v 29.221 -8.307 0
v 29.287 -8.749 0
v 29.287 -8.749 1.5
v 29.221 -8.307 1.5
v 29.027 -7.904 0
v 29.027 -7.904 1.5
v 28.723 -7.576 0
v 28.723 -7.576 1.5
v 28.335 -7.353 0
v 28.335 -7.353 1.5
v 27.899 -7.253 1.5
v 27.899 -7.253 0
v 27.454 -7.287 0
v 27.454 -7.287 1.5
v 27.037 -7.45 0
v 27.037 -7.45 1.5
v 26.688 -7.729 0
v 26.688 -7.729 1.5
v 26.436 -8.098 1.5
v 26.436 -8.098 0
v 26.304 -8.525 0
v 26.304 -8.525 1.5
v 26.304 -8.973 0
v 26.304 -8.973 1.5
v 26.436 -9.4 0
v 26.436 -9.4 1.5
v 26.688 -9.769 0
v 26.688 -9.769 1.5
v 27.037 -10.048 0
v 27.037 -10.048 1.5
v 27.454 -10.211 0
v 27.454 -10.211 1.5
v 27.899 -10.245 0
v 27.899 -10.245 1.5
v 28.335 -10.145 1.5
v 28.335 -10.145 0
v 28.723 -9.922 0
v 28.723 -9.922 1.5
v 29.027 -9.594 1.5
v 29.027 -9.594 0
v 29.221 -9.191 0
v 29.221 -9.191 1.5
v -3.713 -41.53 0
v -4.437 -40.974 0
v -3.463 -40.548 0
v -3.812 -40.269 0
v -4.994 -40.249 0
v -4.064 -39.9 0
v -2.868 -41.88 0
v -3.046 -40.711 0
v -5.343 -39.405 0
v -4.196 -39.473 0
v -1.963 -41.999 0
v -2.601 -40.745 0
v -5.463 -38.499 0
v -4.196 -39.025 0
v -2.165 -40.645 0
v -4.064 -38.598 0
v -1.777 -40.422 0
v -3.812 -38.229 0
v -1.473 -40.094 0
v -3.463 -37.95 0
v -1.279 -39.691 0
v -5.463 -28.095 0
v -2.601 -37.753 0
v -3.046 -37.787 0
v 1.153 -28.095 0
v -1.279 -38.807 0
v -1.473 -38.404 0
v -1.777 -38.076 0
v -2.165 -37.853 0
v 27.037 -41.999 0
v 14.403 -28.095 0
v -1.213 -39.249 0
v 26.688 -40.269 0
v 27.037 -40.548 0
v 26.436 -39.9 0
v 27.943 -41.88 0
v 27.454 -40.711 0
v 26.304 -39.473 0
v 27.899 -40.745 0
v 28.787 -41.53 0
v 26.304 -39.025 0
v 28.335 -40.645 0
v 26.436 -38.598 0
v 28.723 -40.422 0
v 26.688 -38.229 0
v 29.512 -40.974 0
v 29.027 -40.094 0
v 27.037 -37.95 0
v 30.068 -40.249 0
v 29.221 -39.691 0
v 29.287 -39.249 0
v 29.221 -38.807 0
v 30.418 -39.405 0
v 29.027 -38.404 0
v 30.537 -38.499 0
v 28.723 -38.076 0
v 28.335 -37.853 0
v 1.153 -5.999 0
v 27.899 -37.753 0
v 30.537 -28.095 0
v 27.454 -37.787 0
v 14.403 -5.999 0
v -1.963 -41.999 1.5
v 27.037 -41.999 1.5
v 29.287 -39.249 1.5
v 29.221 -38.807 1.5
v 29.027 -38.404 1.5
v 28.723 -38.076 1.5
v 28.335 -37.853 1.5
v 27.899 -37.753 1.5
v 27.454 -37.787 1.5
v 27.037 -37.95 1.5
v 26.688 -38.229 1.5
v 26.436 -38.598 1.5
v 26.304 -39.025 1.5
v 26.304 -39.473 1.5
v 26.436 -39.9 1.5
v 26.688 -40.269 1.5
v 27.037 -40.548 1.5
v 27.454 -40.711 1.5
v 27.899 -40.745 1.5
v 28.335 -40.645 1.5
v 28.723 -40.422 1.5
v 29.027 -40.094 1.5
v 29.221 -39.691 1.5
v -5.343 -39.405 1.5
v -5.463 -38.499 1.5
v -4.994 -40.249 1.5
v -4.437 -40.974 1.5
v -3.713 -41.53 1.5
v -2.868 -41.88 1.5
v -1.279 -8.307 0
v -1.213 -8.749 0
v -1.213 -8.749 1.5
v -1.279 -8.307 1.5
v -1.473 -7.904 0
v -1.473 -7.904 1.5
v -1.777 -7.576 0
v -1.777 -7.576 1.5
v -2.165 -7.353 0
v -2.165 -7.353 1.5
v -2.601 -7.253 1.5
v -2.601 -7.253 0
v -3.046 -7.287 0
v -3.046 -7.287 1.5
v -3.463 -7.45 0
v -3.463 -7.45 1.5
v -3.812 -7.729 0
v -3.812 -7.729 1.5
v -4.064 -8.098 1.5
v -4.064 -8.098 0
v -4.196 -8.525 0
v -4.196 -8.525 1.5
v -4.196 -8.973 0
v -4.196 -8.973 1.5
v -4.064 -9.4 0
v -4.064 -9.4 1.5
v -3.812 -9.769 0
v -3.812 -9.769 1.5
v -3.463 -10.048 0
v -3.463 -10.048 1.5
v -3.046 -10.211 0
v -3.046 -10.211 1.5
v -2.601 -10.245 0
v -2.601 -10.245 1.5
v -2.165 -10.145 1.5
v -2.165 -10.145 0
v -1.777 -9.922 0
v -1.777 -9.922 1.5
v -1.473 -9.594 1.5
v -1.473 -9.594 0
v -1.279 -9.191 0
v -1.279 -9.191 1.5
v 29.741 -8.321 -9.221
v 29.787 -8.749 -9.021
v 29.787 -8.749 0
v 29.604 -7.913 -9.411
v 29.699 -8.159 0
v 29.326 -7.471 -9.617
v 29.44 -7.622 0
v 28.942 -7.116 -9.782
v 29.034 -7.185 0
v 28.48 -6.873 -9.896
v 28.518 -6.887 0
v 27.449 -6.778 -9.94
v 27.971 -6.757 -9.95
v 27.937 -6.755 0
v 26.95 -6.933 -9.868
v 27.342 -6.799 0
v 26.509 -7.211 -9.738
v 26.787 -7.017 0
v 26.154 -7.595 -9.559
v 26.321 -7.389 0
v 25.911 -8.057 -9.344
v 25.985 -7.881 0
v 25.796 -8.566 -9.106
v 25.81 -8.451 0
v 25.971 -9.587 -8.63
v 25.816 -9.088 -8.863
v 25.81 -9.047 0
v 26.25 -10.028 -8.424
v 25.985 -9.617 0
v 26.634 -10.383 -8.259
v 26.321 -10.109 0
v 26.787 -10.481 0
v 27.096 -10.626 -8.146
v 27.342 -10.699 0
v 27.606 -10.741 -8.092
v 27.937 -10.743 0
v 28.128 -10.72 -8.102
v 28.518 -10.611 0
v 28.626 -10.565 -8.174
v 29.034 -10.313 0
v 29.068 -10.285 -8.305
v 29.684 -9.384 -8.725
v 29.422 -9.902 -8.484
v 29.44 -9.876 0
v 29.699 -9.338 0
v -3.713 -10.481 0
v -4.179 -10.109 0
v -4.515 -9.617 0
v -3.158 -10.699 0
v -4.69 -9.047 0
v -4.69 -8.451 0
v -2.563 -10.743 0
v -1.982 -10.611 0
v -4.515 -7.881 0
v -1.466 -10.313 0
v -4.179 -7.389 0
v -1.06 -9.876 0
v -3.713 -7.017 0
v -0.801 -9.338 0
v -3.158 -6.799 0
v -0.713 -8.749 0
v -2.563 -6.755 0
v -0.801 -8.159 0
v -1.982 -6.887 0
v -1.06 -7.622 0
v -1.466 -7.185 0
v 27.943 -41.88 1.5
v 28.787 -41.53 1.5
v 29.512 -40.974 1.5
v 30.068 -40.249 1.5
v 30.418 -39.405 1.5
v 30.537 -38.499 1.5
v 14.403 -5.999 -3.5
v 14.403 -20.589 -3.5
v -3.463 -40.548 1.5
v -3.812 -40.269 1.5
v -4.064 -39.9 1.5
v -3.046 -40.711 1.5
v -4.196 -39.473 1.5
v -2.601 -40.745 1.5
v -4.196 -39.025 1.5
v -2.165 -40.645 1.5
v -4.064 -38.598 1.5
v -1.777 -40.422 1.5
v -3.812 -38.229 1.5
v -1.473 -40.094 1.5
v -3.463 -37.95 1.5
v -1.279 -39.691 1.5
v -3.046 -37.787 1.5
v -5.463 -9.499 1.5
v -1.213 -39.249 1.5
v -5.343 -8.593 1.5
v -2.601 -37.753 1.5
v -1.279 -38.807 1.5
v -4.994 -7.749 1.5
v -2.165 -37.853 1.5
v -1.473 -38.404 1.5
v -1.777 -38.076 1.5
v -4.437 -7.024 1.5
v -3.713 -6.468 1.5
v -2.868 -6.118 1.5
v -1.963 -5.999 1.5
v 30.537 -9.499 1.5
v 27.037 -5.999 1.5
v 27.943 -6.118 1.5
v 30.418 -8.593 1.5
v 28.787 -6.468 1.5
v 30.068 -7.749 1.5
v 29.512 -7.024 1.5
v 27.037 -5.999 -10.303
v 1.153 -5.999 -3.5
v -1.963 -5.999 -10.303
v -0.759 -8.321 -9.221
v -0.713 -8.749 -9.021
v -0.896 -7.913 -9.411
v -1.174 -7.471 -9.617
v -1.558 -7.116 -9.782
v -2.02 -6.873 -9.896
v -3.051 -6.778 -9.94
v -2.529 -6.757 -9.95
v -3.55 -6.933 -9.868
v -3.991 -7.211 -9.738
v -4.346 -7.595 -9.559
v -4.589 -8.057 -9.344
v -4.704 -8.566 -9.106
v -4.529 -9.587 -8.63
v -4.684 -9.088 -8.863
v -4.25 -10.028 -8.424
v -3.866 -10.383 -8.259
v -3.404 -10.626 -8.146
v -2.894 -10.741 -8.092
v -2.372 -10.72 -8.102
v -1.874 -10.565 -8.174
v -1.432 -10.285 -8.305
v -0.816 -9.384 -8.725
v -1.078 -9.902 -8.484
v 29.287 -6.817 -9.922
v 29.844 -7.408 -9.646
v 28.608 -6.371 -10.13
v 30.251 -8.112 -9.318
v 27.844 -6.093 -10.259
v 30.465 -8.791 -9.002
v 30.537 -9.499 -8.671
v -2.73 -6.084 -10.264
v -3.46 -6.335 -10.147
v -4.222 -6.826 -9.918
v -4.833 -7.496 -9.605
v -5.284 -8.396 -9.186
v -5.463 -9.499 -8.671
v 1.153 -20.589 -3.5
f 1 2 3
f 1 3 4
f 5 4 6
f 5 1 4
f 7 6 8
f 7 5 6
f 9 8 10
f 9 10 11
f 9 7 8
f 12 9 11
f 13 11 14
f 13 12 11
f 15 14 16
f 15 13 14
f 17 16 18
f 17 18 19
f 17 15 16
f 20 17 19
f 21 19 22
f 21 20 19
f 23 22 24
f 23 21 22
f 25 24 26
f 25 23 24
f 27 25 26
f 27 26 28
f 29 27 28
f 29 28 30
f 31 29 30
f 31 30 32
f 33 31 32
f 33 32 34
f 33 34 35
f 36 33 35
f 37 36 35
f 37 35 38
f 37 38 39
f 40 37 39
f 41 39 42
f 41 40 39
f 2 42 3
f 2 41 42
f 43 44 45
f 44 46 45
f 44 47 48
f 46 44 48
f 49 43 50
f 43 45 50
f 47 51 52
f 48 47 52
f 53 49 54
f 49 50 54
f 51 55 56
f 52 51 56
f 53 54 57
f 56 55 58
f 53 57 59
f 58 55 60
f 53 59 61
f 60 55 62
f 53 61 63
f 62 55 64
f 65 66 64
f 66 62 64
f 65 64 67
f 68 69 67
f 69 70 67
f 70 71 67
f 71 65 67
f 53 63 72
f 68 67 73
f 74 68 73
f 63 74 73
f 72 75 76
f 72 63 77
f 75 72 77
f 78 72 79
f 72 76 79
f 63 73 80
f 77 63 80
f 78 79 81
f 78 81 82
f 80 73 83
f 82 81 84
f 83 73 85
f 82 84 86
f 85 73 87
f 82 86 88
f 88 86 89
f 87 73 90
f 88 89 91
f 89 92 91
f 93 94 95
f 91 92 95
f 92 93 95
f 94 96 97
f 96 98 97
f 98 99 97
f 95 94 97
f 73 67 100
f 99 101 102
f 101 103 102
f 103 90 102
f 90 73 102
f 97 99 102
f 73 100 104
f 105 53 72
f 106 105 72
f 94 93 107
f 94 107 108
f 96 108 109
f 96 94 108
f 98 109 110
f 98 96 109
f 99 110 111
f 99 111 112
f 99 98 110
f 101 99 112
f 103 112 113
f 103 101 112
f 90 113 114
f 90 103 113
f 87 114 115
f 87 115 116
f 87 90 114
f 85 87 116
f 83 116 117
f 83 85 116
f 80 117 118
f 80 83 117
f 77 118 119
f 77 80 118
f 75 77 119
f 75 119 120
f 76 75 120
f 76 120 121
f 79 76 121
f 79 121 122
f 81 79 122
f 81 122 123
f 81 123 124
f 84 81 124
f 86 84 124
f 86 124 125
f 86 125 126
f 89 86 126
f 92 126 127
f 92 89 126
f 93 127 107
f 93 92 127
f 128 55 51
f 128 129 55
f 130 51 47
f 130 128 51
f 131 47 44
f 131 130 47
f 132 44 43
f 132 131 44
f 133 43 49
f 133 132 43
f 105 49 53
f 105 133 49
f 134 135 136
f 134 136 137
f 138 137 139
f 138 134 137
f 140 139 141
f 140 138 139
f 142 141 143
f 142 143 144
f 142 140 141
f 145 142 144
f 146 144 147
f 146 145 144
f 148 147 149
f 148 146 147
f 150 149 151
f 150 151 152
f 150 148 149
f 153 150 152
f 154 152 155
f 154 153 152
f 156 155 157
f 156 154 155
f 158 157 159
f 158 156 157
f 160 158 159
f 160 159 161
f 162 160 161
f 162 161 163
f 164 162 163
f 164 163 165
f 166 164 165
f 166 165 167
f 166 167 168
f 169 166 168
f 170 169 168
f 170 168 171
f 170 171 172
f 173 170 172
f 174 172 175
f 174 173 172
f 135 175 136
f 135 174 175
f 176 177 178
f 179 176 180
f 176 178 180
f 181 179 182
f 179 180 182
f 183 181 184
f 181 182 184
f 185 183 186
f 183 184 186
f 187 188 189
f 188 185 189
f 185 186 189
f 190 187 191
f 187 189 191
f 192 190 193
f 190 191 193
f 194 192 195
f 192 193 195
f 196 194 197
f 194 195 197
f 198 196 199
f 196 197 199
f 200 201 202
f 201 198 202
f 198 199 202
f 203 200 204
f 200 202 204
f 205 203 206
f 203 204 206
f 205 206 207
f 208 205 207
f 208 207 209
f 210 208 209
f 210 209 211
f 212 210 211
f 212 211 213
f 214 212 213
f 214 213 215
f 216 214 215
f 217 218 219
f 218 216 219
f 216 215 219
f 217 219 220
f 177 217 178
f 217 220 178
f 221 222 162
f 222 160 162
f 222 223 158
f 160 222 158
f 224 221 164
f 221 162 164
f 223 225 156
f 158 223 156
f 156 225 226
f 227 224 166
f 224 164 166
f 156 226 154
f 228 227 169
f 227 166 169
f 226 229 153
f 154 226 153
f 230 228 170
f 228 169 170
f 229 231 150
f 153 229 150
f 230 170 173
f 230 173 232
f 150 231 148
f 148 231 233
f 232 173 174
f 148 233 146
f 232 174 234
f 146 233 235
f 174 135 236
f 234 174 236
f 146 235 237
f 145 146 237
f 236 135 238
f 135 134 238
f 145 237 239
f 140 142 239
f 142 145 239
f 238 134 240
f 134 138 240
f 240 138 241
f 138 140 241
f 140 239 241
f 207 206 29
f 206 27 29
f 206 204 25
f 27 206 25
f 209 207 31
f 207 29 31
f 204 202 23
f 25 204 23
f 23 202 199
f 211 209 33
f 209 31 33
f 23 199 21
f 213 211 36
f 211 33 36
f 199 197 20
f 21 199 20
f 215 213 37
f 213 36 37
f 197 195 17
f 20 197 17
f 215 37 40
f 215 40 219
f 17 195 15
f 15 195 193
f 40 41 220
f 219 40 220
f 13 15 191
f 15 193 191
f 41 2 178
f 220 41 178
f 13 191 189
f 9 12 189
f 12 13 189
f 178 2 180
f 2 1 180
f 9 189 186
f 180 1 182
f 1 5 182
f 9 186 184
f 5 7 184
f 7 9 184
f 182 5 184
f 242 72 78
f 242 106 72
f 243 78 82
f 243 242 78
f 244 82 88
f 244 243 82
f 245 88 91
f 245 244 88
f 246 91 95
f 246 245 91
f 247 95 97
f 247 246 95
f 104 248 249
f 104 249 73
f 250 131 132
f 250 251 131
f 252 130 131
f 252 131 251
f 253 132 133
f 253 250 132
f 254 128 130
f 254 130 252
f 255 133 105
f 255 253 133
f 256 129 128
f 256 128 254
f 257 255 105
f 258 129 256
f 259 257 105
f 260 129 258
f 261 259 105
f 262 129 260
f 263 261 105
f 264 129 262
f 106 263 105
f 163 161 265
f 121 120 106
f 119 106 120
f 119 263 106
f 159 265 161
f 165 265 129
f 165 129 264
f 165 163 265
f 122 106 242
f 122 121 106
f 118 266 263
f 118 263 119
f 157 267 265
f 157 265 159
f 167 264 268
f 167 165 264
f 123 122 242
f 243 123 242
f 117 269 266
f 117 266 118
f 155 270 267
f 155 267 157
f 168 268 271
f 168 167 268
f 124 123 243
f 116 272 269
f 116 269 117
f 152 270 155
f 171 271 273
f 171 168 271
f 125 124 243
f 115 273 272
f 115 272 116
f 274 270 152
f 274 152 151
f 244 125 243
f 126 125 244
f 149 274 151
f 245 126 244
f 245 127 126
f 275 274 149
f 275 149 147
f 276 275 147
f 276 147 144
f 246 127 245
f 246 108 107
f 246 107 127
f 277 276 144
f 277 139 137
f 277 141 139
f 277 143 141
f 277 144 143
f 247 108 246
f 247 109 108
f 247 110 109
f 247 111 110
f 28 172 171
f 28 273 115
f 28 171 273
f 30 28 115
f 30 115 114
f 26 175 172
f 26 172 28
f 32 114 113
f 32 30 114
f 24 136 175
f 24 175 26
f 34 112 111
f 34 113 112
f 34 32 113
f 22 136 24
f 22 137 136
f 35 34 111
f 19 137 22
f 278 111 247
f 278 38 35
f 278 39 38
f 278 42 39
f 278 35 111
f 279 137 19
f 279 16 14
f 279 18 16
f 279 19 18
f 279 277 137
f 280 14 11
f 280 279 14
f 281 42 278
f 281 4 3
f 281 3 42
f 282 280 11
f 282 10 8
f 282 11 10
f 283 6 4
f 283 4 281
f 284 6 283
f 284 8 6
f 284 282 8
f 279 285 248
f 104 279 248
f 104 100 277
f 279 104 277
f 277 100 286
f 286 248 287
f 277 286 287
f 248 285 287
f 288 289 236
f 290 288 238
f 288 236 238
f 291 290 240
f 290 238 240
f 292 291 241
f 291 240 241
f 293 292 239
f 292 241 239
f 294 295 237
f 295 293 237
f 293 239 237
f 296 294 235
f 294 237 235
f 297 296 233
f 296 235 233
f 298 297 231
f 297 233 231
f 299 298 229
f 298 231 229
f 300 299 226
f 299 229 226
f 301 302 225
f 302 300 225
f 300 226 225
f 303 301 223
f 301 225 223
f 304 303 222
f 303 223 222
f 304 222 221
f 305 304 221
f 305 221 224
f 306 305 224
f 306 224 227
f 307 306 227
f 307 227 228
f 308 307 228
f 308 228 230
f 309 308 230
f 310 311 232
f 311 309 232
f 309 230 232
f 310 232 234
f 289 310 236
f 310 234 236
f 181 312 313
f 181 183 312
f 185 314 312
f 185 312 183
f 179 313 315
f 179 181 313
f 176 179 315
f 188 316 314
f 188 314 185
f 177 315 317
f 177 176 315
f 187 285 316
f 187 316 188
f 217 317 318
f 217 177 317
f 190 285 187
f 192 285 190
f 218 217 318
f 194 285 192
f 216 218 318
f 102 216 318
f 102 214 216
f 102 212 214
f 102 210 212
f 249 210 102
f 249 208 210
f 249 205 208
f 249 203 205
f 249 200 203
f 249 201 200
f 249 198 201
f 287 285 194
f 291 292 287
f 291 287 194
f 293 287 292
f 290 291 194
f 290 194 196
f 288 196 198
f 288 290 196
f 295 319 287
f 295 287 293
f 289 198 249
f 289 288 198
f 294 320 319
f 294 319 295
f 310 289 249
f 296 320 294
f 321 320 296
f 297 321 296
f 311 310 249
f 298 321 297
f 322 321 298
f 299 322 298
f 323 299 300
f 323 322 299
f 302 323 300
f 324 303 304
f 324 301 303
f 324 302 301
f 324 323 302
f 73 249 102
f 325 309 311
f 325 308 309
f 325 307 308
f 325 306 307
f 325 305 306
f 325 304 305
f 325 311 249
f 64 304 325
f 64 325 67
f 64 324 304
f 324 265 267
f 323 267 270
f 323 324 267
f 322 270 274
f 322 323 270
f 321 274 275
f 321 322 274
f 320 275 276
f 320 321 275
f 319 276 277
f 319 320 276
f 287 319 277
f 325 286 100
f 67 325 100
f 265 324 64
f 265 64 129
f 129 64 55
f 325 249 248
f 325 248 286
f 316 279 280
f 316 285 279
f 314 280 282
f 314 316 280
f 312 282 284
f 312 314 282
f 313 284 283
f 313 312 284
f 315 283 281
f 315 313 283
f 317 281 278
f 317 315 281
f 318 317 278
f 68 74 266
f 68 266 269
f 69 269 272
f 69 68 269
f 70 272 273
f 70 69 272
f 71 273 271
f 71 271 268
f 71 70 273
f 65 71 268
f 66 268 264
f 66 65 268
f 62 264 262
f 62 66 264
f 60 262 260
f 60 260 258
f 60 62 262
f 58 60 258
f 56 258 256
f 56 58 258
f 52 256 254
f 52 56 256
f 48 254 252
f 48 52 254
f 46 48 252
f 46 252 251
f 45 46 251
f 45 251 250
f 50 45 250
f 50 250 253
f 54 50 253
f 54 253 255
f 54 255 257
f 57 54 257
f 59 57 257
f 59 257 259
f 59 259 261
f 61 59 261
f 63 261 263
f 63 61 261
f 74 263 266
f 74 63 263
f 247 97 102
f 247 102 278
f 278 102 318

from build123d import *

# Parameters (mm, degrees)
F0_R     = 1.5
F0_R_2   = 2
F1_DEPTH = 1.5
F3_DEPTH = 36
F4_W     = 13.25
F4_H     = 3.5
F5_DEPTH = 25
F6_DEPTH = 25
F7_DEPTH = 1.5
F8_R     = 3.5


with BuildPart() as f1:
    # F0 (on Top) → F1 (new body)
    with BuildSketch(Plane.XY):
        Polygon((-4.012614, -5.998938), (-5.462614, -5.998938), (-5.462614, -11.098938), (-5.462614, -36.898938), (-5.462614, -41.998938), (-4.012614, -41.998938), (29.087386, -41.998938), (30.537386, -41.998938), (30.537386, -36.898938), (30.537386, -11.098938), (30.537386, -5.998938), (29.087386, -5.998938), align=None)
        with Locations((-2.712614, -39.248938)):
            Circle(F0_R, mode=Mode.SUBTRACT)
        with Locations((27.787386, -39.248938)):
            Circle(F0_R, mode=Mode.SUBTRACT)
        with Locations((-2.712614, -8.748938)):
            Circle(F0_R_2, mode=Mode.SUBTRACT)
        with Locations((27.787386, -8.748938)):
            Circle(F0_R_2, mode=Mode.SUBTRACT)
    extrude(amount=F1_DEPTH)

    # F2 (on face) → F3 (join)
    with BuildSketch(Plane(origin=(-5.462614, 0, 0), x_dir=(0, -1, 0), z_dir=(-1, 0, 0))):
        Polygon((28.094722, 0), (5.998938, 0), (5.998938, -10.303433), align=None)
    extrude(amount=-F3_DEPTH)

    # F4 (on face) → F5 (cut)
    with BuildSketch(Plane(origin=(0, -5.998938, 0), x_dir=(-1, 0, 0), z_dir=(0, 1, 0))):
        with Locations((-7.778386, -1.75)):
            Rectangle(F4_W, F4_H)
    extrude(amount=-F5_DEPTH, mode=Mode.SUBTRACT)

    # F0 (on Top) → F6 (cut)
    with BuildSketch(Plane.XY):
        with Locations((27.787386, -8.748938)):
            Circle(F0_R_2)
        with Locations((27.787386, -8.748938)):
            Circle(F0_R, mode=Mode.SUBTRACT)
        with Locations((-2.712614, -8.748938)):
            Circle(F0_R_2)
        with Locations((-2.712614, -8.748938)):
            Circle(F0_R, mode=Mode.SUBTRACT)
        with Locations((-2.712614, -8.748938)):
            Circle(F0_R)
        with Locations((27.787386, -8.748938)):
            Circle(F0_R)
    extrude(amount=-F6_DEPTH, mode=Mode.SUBTRACT)

    # F0 (on Top) → F7 (join)
    with BuildSketch(Plane.XY):
        with Locations((27.787386, -8.748938)):
            Circle(F0_R_2)
        with Locations((27.787386, -8.748938)):
            Circle(F0_R, mode=Mode.SUBTRACT)
        with Locations((-2.712614, -8.748938)):
            Circle(F0_R_2)
        with Locations((-2.712614, -8.748938)):
            Circle(F0_R, mode=Mode.SUBTRACT)
    extrude(amount=F7_DEPTH)

    # F8
    f8_edges = [f1.edges().sort_by_distance(p)[0] for p in [
        (-5.462614, -5.998938, -4.401717),
        (-5.462614, -41.998938, 0.75),
        (30.537386, -5.998938, -4.401717),
        (30.537386, -41.998938, 0.75),
    ]]
    fillet(f8_edges, radius=F8_R)


solid = f1.part
